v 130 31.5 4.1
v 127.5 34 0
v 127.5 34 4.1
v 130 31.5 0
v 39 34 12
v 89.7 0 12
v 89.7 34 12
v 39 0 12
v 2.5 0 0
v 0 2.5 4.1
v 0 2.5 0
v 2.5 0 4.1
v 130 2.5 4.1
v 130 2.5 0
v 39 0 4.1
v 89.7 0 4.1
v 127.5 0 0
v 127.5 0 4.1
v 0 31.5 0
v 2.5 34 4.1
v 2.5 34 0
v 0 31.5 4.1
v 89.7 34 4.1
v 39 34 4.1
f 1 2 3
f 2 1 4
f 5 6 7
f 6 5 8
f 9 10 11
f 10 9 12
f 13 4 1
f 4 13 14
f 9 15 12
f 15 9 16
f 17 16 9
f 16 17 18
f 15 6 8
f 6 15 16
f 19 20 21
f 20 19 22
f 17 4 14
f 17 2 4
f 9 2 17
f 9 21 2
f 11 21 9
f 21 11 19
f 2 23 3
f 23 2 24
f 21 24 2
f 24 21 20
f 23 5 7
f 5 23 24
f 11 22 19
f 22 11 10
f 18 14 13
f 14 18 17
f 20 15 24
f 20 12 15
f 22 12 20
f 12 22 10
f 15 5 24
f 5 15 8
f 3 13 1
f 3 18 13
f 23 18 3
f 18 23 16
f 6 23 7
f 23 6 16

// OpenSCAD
$fn = 32;

// ----------------------------------------------------------------------
// Stepped bar: centerstep, 130 x 34 x 12/4.1 mm
// ----------------------------------------------------------------------

// --- parameters (mm) ---
bar_l = 130;              // bar length, X
bar_w = 34;               // bar width, Y
plate_t = 12;             // thickness of the thick zone, Z
thin_t = 4.1;             // thickness of the thin zone
corner_c = 2.5;           // corner chamfer of the bar
step_cut = 7.9;           // material removed from the thin zone
thick_from = 39;          // start of the thick middle zone
thick_to = 89.7;          // end of the thick middle zone
depth_1 = 7.9;            // depth of cut 1 from the top face
depth_2 = 7.9;            // depth of cut 2 from the top face
fit_tol = 0.05;           // declared fit tolerance (prompt contract)
free_tol = 0.3;           // declared free tolerance (prompt contract)

profile = [[2.5, 0], [127.5, 0], [130, 2.5], [130, 31.5], [127.5, 34], [2.5, 34], [0, 31.5], [0, 2.5]];  // primary outline, 8 points, counter clockwise
void_1 = [[-1, -1], [39, -1], [39, 35], [-1, 35]];  // thin left end, 4 points
void_2 = [[89.7, -1], [131, -1], [131, 35], [89.7, 35]];  // thin right end, 4 points

// --- the one profile operation ---
difference() {
  linear_extrude(height = plate_t) polygon(points = profile);
  translate([0, 0, plate_t - depth_1])
    linear_extrude(height = depth_1 + 1) polygon(points = void_1);
  translate([0, 0, plate_t - depth_2])
    linear_extrude(height = depth_2 + 1) polygon(points = void_2);
}
